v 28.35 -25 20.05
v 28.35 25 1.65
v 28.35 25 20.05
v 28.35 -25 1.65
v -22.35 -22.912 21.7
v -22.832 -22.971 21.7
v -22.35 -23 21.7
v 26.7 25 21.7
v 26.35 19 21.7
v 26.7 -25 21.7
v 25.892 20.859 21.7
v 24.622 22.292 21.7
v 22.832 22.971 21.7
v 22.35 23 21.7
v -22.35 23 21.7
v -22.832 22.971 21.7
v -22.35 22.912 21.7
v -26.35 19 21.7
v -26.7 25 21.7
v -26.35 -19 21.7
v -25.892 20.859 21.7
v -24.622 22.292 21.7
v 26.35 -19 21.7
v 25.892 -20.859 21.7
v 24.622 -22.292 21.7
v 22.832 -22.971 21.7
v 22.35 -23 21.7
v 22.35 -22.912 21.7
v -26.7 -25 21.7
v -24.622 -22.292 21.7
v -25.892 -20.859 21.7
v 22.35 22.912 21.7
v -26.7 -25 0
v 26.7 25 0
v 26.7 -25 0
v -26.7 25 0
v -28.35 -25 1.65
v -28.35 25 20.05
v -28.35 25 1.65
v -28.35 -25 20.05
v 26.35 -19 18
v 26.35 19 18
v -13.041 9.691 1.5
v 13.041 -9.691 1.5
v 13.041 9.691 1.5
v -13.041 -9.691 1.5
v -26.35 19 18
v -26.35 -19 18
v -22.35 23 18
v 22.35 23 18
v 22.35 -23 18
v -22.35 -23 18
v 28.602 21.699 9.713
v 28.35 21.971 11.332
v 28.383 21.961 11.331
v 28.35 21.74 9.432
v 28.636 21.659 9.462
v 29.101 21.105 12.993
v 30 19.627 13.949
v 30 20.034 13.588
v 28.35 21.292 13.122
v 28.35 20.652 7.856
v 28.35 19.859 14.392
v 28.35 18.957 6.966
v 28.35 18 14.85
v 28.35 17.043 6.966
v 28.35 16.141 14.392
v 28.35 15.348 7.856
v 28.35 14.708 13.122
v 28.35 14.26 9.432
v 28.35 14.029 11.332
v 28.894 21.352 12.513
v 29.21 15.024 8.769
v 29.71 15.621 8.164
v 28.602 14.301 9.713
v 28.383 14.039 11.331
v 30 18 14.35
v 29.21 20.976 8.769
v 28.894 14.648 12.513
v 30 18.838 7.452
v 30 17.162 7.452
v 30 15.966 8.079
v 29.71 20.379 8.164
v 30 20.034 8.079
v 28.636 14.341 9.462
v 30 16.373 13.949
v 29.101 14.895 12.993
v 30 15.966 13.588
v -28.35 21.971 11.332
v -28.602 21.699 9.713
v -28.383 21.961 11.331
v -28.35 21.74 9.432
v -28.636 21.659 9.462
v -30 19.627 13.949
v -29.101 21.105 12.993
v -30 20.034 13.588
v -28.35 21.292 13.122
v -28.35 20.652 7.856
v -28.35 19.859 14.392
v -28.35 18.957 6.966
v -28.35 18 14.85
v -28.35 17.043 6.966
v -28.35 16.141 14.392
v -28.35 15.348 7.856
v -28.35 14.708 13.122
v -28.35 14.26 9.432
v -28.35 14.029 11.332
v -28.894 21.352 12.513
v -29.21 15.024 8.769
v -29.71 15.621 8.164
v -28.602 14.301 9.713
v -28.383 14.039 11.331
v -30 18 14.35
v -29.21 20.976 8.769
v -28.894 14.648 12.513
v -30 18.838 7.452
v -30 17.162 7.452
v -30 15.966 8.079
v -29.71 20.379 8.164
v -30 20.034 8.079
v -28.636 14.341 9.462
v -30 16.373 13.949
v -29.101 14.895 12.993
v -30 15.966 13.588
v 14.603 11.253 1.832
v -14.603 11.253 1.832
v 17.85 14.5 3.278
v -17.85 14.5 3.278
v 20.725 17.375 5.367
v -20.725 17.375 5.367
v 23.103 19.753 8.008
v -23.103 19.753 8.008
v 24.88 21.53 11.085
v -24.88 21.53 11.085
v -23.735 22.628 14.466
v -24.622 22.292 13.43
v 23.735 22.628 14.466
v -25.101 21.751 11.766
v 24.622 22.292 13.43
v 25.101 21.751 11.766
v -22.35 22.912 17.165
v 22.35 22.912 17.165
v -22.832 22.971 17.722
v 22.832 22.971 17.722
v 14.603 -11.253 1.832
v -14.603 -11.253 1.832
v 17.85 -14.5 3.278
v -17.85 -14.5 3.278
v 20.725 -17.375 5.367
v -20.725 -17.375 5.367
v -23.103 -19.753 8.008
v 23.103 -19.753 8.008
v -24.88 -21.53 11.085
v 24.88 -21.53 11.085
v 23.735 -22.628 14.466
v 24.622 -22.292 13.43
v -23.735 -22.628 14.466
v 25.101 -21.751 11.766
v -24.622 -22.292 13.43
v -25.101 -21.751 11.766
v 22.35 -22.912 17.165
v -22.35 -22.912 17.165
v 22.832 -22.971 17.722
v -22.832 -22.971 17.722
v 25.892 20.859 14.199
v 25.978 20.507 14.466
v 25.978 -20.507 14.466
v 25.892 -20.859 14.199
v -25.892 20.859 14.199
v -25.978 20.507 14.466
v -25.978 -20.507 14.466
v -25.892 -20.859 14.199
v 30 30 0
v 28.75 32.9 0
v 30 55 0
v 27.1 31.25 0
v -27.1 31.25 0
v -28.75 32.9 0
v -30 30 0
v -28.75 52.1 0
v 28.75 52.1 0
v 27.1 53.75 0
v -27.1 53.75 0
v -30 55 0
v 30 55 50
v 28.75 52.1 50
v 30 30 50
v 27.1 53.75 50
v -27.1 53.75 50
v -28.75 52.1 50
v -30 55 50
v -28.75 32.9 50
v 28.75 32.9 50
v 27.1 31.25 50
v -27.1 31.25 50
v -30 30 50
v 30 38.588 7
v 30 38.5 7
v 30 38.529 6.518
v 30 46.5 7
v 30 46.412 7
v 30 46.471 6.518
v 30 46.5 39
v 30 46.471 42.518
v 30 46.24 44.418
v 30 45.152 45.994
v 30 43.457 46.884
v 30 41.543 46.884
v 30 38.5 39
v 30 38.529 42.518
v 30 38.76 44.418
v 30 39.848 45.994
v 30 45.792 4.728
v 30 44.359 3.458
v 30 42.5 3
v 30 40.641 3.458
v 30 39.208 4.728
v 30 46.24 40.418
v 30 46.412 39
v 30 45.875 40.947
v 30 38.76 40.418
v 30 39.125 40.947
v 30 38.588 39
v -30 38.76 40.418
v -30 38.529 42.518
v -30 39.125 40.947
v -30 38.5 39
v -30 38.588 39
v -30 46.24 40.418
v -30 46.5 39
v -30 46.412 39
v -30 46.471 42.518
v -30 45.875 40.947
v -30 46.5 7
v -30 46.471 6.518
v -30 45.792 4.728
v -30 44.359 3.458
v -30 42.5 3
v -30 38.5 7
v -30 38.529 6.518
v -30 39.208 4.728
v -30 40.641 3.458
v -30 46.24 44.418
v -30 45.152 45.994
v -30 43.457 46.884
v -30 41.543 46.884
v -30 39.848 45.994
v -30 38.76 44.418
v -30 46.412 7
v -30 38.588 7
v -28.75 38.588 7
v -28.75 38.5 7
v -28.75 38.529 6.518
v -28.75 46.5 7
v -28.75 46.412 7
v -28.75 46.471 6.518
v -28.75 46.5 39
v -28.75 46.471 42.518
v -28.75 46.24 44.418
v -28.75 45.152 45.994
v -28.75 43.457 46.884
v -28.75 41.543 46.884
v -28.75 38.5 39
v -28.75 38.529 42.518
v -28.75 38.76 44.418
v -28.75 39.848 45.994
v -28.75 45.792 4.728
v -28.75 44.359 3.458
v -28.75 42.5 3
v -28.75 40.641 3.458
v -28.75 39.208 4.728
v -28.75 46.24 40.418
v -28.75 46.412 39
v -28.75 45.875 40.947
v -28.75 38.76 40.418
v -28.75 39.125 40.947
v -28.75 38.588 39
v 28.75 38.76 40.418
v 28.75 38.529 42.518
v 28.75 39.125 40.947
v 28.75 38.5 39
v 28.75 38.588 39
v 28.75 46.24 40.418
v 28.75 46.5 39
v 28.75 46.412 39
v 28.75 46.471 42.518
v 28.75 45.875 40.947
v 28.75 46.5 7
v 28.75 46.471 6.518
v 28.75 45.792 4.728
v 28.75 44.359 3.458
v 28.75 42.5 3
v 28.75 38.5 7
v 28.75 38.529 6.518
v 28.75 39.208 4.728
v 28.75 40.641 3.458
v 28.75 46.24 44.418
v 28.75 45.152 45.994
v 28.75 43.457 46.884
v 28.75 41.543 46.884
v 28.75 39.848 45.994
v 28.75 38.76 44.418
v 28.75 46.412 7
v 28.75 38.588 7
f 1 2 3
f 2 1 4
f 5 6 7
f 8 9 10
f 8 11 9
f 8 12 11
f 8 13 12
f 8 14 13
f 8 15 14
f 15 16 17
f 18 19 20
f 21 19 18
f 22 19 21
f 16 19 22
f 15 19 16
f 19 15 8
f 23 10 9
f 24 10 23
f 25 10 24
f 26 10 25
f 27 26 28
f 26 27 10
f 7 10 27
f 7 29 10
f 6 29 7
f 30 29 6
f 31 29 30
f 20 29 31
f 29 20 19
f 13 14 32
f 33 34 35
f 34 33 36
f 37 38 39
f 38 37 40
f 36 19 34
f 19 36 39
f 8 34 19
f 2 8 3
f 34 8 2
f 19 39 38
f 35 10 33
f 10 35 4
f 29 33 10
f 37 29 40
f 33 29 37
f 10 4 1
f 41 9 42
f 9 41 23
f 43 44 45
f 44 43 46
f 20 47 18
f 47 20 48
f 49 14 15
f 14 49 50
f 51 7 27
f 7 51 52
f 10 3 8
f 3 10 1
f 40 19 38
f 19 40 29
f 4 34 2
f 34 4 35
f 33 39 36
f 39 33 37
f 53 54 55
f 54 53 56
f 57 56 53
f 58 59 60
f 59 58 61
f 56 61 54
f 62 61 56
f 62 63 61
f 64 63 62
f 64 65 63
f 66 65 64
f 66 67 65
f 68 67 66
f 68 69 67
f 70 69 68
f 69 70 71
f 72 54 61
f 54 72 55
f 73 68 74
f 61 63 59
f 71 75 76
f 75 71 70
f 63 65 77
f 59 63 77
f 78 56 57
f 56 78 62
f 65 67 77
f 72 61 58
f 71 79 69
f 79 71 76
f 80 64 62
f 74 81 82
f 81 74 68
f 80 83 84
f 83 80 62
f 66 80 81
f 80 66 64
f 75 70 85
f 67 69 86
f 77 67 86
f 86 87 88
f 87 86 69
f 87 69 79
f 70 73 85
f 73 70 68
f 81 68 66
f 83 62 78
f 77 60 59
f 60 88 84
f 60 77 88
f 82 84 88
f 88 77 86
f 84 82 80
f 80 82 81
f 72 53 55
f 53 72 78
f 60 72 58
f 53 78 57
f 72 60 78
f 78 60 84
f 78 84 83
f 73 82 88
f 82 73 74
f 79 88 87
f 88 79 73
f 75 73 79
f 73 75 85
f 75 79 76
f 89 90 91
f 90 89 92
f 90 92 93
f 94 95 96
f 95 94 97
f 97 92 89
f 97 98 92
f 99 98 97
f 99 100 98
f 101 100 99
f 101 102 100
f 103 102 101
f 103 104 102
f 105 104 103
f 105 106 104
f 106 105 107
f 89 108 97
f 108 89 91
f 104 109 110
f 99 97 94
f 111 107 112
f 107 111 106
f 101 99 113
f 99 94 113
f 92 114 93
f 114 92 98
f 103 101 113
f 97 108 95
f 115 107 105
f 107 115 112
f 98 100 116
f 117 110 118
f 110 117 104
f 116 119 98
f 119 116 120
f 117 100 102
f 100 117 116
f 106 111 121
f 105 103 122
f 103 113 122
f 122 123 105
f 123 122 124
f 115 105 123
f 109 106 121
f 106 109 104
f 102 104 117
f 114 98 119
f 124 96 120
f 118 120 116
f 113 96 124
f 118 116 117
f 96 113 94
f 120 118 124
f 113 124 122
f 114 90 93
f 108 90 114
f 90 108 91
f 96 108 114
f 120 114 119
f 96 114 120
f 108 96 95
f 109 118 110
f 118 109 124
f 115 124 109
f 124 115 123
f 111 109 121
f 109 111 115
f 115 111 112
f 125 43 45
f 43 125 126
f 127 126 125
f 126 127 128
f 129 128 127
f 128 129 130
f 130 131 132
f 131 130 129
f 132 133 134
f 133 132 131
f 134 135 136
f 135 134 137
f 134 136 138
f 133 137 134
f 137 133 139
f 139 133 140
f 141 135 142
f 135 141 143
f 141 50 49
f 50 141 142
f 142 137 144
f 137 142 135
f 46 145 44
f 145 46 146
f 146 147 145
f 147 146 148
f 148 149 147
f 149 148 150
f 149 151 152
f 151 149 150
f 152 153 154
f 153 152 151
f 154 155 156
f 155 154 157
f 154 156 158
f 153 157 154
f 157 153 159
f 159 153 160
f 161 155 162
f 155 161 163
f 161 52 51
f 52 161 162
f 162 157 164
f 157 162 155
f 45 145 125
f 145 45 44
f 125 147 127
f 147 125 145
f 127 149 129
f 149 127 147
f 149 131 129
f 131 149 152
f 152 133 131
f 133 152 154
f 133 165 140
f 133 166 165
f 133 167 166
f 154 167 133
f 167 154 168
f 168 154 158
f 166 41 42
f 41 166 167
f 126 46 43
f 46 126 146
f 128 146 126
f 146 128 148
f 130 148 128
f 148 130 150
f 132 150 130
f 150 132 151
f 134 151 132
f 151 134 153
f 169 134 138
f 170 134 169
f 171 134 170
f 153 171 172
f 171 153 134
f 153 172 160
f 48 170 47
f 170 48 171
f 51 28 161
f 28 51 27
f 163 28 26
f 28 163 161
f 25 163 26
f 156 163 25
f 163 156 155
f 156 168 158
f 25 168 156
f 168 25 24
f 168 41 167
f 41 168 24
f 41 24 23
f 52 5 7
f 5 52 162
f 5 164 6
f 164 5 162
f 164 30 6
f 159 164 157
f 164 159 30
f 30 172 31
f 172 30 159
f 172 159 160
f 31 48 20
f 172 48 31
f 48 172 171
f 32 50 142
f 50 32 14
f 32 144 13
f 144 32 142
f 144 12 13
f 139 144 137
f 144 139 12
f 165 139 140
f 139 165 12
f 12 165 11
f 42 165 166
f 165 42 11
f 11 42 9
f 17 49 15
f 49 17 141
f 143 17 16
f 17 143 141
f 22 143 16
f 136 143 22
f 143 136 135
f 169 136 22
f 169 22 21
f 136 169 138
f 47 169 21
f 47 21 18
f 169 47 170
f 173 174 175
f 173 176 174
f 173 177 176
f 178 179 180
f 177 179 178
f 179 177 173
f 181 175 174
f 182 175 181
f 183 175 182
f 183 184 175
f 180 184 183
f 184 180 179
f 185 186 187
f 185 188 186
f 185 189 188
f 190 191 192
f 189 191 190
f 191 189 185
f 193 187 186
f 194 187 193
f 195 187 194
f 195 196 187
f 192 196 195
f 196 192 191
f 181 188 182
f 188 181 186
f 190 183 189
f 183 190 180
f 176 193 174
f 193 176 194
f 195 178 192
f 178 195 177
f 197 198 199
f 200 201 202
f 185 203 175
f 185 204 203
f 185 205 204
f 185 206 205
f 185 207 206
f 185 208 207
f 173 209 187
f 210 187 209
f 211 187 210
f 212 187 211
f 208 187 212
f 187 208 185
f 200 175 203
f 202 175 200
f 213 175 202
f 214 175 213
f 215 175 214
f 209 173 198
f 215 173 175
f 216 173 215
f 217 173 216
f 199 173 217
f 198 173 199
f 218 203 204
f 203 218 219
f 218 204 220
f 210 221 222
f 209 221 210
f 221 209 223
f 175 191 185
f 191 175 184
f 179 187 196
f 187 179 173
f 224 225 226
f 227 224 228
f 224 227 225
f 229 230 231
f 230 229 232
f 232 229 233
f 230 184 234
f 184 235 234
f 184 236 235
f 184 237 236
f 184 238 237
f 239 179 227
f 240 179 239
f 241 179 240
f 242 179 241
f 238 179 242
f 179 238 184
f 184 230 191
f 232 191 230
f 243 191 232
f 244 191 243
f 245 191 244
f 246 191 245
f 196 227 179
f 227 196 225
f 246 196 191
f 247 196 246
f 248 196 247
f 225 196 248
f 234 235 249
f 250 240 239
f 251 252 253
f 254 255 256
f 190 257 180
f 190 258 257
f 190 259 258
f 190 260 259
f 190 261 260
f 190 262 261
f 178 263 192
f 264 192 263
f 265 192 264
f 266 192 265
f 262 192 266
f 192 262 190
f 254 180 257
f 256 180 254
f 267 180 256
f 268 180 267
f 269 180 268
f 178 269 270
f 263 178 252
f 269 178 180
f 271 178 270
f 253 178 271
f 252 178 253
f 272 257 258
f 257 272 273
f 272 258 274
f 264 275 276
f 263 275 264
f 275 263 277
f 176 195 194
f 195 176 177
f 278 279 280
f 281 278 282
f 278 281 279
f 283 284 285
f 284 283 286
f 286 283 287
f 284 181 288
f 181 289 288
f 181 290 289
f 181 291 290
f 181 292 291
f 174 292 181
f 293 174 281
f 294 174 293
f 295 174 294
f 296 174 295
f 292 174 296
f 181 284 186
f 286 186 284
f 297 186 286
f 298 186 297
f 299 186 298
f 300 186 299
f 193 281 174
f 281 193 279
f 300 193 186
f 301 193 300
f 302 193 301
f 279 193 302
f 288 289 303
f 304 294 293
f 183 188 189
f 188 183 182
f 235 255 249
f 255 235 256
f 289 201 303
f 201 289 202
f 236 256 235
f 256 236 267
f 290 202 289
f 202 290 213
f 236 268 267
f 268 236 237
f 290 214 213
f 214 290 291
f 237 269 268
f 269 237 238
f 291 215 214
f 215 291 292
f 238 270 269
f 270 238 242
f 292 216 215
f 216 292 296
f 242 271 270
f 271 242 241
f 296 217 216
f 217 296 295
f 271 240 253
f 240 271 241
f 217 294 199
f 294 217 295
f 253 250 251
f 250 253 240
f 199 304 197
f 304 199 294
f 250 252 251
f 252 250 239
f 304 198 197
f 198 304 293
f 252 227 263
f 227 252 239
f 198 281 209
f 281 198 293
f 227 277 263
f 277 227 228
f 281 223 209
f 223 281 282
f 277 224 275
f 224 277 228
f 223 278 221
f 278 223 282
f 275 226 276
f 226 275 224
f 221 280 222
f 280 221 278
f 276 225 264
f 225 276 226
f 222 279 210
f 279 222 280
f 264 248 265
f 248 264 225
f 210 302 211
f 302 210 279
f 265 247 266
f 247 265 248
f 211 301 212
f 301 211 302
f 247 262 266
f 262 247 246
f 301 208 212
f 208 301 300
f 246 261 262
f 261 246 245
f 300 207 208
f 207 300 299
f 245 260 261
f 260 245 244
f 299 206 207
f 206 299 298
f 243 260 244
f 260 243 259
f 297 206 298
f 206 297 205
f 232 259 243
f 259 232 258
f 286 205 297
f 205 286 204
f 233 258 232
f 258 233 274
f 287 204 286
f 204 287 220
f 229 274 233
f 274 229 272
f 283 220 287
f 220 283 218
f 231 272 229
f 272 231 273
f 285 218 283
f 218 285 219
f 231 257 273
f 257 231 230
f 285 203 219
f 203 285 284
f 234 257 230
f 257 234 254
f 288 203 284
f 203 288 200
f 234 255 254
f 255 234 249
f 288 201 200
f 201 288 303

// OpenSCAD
echo(version=version());

// Which part do you need? (Both, Sleeve, Box)
Selector="BOTH"; //["BOTH","SLEEVE","BOX"]
// Hex Pattern? (Off, On)
Hex_On="Off"; //["Off","On"]

// Overall Width
Width=60; //[25:150]
// Overall Depth
Depth=50; //[25:150]
// Overall Height
Height=25;  //[20:75]

/* Sleeve Settings */
//Sleeve Wall Thickness
Sleeve_Wall=1.25; // 1.25
//Overall Difference Between Box and Sleeve
Sleeve_Gap=0.8; // 0.8

/* Box Settings */
//Box Wall Thickness
Box_Wall=2;
//Box Floor Thickness
Floor=1; // 1.00
//Horizontal Inside Corners
Scoop_Radius=17; // 17.00
//Vertical Inside Corners
V_Radius=4; // 4.00
//Chamfers on Sliding Corners
Chamfer=1.65; // 1.65

/* Pin Measurements */
//Pin Diameter
P_Dia=8;
//Pin Inset from end of box
P_Inset=7; 
// Offset creating retention bump
P_Offset=4;

/* Pattern Measurements */
// Flat side of hex for Hex Pattern
Hex_Size=3.5;
//Minimum Distance From Edge to Hex
Border=1;


//Box
if(Selector!="SLEEVE"){
  translate([0,0,Height/2-Sleeve_Wall-Sleeve_Gap/2])
  box();
};

//Sleeve
if(Selector!="BOX"){
  color("cyan"){
    translate([0,Depth/2+Height/2+5,Depth/2])
    rotate([90,0,0])
    sleeve();  
  };
};  
    
//box module
module box(Width_Box=Width-Sleeve_Wall*2-Sleeve_Gap,Depth_Box=Depth,Height_Box=Height-Sleeve_Wall*2-Sleeve_Gap){
  //box body
  union(){
    difference(){
      difference(){
        cube([Width_Box,Depth_Box,Height_Box], center=true);
        translate([0,0,Floor]){
          cube([Width_Box-2*Box_Wall,Depth_Box-2*Box_Wall,Height_Box-Floor], center=true);
        };
      //corner chamfers
      Corner_Remove(Width_Box,Height_Box,Depth+1);
      };
    };
    //pin
    mirror([1,0,0]){
      Pin(P_Dia,P_Inset,Width_Box/2);  
    };
    Pin(P_Dia,P_Inset,Width_Box/2);  
    //Corners
    translate([0,0,-Height_Box+Floor+Scoop_Radius]){
      Scoop_Corner(Width_Box-2*Box_Wall,Depth_Box-2*Box_Wall,Height_Box);
      mirror([1,0,0]){
        Scoop_Corner(Width_Box-2*Box_Wall,Depth_Box-2*Box_Wall,Height_Box);
      };
      rotate([0,0,90]){
        Scoop_Corner(Depth_Box-2*Box_Wall,Width_Box-2*Box_Wall,Height_Box);
        mirror([1,0,0]){
          Scoop_Corner(Depth_Box-2*Box_Wall,Width_Box-2*Box_Wall,Height_Box);
        };
      };    
    };
    V_Corner(Width_Box-2*Box_Wall,Depth_Box-2*Box_Wall,Height_Box);
    mirror([1,0,0]){
      V_Corner(Width_Box-2*Box_Wall,Depth_Box-2*Box_Wall,Height_Box);
    };
    
    mirror([0,1,0]){   
      V_Corner(Width_Box-2*Box_Wall,Depth_Box-2*Box_Wall,Height_Box);
      mirror([1,0,0]){
        V_Corner(Width_Box-2*Box_Wall,Depth_Box-2*Box_Wall,Height_Box);
      };
    };
  
    
    
  };
};

module Corner_Remove(Width_cr,Height_cr,Depth_cr){
  rotate([90,0,0]){
    linear_extrude(height=Depth_cr, center=true){       
      difference(){
        union(){
          Rotate_Square(Width_cr/2,Height_cr/2);
          Rotate_Square(Width_cr/2,-Height_cr/2);
          Rotate_Square(-Width_cr/2,-Height_cr/2);
          Rotate_Square(-Width_cr/2,Height_cr/2);
        };
      };
    };
  };
};

module Rotate_Square(Offset_X,Offset_Y){
  translate([Offset_X,Offset_Y,0]){
    rotate([0,0,45]){
      square(sqrt(2*Chamfer*Chamfer),center=true);
    };
  };    
};
module Pin(Dia,Inset,Offset){
  translate([Offset,Depth/2-Inset,0]){
    intersection(){
      rotate([0,90,0]){
        rotate_extrude(convexity = 30){
          polygon([[0,0],[Dia/2,0],[Dia/2-.5,(Width/2-Offset)],[0,(Width/2-Offset)]],[[0,1,2,3]]);
        };
      };
      rotate([0,0,270]){
        linear_extrude(height=Height, center=true){
          polygon([[-Dia/2,0],[Dia/2,0],[Dia/2-tan(50)*(Width/2-Offset),(Width/2-Offset)],[-(Dia/2-tan(50)*(Width/2-Offset)),(Width/2-Offset)]],[[0,1,2,3]]);  
        };
      };
    };
  };
};
module Scoop_Corner(S_Depth,S_Width,S_Height){
  translate([S_Depth/2-Scoop_Radius,0,S_Height/2]){
    rotate([-90,0,0]){
      linear_extrude(height=S_Width, center=true){
        difference(){
          square(Scoop_Radius);
          circle(Scoop_Radius);
        };
      };
    };
  };
};

module V_Corner(S_Depth,S_Width,S_Height){
  translate([S_Depth/2-V_Radius,S_Width/2-V_Radius,0]){
    rotate([0,0,0]){
      linear_extrude(height=S_Height, center=true){
        difference(){
          square(V_Radius);
          circle(V_Radius);
        };
      };
    };
  };
};

//Sleeve Module
module sleeve(){
  difference(){
    translate([0,Depth/2,0]){
      rotate([90,0,0]){
        difference(){
          union(){
            linear_extrude(height=Depth){
              difference(){
                square([Width,Height],center=true);
                square([Width-2*Sleeve_Wall,Height-2*Sleeve_Wall],center=true);
              };
            };
            //Corner Chamfers
            rotate([90,0,0]){
              translate([0,Depth/2,0]){
                intersection(){  
                  Corner_Remove(Width-2*Sleeve_Wall,Height-2*Sleeve_Wall,Depth);
                  cube([Width,Depth,Height],center=true);
                };  
              };
            };
          };
          
          Sleeve_Notch(P_Dia,P_Inset,P_Offset); //Diameter, Inset, Offset
        };
      };
    };
    if (Hex_On=="On"){
      Pattern_Placement(X_Hex=floor((Width-2*Border-1.732*Hex_Size)/((1.732*Hex_Size+1))),Y_Hex=floor(((Depth-2*Border-2*Hex_Size)/(cos(30)*(Hex_Size*1.732+1))/2)));
    };
  };
};

module Sleeve_Notch(Dia,Inset,Offset){
  translate([(Width+1)/2,0,Depth/2]){
    rotate([0,-90,0]){ 
      linear_extrude(height=Width+1){
        union(){
          translate([Depth/2-Inset,0,0]){
            circle(d=Dia,center=true);
          };
          translate([-(Depth/2-Inset),0,0]){
            circle(d=Dia,center=true);
          };
          translate([-(Depth/2-Inset-Offset),0,0]){
            circle(d=Dia,center=true);
          };
          translate([Offset/2,0,0]){
            square([Depth-2*Inset-Offset,Dia],center=true);
          };
        };
      };
    };
  };
};

module Pattern_Placement(){
  translate([0,0,0]){
    translate([-(X_Hex*(Hex_Size*1.732+1)/2),-((Y_Hex*2)*(cos(30)*(Hex_Size*1.732+1)))/2,0]){     
      Hex_Pattern(X_Hex,Y_Hex);
      translate([cos(60)*(Hex_Size*1.732+1),sin(60)*(Hex_Size*1.732+1),0]){
        Hex_Pattern(X_Hex-1,Y_Hex-1);
      };
    };
  };
};


module Hex_Pattern(Pattern_W,Pattern_D){
  union(){
    translate([0,0,0]){  
   // translate([0,0,0]){  
      for(X_Count=[0:Pattern_W]){
        for(Y_Count=[0:Pattern_D]){
          translate([X_Count*(Hex_Size*1.732+1),Y_Count*2*(sin(60)*(Hex_Size*1.732+1)),0]){
            Hex_Indent(Hex_Size);
            
          };
        };
      };
    };
  };
};    

module Hex_Indent(Dia){
  H_Depth=.5;
  rotate([0,0,90]){
    translate([0,0,Height/2-H_Depth]){
      difference(){
        linear_extrude(height=1){
          angles=[ for (i = [0:5]) i*(360/6) ];
 	      coords=[ for (th=angles) [Dia*cos(th), Dia*sin(th)] ];
          polygon(coords);
        };
        for(i=[0:5]){
          rotate([0,0,i*60]){  
            translate([0,1.732/2*Dia-H_Depth,0]){
              rotate([0,-90,0]){
                linear_extrude(height=2*Dia,center=true){
                  polygon([[0,0],[H_Depth,H_Depth],[0-.5,H_Depth+.5]]);
                };
              };
            };
          };
        };
      };
    };
  };    
};    
